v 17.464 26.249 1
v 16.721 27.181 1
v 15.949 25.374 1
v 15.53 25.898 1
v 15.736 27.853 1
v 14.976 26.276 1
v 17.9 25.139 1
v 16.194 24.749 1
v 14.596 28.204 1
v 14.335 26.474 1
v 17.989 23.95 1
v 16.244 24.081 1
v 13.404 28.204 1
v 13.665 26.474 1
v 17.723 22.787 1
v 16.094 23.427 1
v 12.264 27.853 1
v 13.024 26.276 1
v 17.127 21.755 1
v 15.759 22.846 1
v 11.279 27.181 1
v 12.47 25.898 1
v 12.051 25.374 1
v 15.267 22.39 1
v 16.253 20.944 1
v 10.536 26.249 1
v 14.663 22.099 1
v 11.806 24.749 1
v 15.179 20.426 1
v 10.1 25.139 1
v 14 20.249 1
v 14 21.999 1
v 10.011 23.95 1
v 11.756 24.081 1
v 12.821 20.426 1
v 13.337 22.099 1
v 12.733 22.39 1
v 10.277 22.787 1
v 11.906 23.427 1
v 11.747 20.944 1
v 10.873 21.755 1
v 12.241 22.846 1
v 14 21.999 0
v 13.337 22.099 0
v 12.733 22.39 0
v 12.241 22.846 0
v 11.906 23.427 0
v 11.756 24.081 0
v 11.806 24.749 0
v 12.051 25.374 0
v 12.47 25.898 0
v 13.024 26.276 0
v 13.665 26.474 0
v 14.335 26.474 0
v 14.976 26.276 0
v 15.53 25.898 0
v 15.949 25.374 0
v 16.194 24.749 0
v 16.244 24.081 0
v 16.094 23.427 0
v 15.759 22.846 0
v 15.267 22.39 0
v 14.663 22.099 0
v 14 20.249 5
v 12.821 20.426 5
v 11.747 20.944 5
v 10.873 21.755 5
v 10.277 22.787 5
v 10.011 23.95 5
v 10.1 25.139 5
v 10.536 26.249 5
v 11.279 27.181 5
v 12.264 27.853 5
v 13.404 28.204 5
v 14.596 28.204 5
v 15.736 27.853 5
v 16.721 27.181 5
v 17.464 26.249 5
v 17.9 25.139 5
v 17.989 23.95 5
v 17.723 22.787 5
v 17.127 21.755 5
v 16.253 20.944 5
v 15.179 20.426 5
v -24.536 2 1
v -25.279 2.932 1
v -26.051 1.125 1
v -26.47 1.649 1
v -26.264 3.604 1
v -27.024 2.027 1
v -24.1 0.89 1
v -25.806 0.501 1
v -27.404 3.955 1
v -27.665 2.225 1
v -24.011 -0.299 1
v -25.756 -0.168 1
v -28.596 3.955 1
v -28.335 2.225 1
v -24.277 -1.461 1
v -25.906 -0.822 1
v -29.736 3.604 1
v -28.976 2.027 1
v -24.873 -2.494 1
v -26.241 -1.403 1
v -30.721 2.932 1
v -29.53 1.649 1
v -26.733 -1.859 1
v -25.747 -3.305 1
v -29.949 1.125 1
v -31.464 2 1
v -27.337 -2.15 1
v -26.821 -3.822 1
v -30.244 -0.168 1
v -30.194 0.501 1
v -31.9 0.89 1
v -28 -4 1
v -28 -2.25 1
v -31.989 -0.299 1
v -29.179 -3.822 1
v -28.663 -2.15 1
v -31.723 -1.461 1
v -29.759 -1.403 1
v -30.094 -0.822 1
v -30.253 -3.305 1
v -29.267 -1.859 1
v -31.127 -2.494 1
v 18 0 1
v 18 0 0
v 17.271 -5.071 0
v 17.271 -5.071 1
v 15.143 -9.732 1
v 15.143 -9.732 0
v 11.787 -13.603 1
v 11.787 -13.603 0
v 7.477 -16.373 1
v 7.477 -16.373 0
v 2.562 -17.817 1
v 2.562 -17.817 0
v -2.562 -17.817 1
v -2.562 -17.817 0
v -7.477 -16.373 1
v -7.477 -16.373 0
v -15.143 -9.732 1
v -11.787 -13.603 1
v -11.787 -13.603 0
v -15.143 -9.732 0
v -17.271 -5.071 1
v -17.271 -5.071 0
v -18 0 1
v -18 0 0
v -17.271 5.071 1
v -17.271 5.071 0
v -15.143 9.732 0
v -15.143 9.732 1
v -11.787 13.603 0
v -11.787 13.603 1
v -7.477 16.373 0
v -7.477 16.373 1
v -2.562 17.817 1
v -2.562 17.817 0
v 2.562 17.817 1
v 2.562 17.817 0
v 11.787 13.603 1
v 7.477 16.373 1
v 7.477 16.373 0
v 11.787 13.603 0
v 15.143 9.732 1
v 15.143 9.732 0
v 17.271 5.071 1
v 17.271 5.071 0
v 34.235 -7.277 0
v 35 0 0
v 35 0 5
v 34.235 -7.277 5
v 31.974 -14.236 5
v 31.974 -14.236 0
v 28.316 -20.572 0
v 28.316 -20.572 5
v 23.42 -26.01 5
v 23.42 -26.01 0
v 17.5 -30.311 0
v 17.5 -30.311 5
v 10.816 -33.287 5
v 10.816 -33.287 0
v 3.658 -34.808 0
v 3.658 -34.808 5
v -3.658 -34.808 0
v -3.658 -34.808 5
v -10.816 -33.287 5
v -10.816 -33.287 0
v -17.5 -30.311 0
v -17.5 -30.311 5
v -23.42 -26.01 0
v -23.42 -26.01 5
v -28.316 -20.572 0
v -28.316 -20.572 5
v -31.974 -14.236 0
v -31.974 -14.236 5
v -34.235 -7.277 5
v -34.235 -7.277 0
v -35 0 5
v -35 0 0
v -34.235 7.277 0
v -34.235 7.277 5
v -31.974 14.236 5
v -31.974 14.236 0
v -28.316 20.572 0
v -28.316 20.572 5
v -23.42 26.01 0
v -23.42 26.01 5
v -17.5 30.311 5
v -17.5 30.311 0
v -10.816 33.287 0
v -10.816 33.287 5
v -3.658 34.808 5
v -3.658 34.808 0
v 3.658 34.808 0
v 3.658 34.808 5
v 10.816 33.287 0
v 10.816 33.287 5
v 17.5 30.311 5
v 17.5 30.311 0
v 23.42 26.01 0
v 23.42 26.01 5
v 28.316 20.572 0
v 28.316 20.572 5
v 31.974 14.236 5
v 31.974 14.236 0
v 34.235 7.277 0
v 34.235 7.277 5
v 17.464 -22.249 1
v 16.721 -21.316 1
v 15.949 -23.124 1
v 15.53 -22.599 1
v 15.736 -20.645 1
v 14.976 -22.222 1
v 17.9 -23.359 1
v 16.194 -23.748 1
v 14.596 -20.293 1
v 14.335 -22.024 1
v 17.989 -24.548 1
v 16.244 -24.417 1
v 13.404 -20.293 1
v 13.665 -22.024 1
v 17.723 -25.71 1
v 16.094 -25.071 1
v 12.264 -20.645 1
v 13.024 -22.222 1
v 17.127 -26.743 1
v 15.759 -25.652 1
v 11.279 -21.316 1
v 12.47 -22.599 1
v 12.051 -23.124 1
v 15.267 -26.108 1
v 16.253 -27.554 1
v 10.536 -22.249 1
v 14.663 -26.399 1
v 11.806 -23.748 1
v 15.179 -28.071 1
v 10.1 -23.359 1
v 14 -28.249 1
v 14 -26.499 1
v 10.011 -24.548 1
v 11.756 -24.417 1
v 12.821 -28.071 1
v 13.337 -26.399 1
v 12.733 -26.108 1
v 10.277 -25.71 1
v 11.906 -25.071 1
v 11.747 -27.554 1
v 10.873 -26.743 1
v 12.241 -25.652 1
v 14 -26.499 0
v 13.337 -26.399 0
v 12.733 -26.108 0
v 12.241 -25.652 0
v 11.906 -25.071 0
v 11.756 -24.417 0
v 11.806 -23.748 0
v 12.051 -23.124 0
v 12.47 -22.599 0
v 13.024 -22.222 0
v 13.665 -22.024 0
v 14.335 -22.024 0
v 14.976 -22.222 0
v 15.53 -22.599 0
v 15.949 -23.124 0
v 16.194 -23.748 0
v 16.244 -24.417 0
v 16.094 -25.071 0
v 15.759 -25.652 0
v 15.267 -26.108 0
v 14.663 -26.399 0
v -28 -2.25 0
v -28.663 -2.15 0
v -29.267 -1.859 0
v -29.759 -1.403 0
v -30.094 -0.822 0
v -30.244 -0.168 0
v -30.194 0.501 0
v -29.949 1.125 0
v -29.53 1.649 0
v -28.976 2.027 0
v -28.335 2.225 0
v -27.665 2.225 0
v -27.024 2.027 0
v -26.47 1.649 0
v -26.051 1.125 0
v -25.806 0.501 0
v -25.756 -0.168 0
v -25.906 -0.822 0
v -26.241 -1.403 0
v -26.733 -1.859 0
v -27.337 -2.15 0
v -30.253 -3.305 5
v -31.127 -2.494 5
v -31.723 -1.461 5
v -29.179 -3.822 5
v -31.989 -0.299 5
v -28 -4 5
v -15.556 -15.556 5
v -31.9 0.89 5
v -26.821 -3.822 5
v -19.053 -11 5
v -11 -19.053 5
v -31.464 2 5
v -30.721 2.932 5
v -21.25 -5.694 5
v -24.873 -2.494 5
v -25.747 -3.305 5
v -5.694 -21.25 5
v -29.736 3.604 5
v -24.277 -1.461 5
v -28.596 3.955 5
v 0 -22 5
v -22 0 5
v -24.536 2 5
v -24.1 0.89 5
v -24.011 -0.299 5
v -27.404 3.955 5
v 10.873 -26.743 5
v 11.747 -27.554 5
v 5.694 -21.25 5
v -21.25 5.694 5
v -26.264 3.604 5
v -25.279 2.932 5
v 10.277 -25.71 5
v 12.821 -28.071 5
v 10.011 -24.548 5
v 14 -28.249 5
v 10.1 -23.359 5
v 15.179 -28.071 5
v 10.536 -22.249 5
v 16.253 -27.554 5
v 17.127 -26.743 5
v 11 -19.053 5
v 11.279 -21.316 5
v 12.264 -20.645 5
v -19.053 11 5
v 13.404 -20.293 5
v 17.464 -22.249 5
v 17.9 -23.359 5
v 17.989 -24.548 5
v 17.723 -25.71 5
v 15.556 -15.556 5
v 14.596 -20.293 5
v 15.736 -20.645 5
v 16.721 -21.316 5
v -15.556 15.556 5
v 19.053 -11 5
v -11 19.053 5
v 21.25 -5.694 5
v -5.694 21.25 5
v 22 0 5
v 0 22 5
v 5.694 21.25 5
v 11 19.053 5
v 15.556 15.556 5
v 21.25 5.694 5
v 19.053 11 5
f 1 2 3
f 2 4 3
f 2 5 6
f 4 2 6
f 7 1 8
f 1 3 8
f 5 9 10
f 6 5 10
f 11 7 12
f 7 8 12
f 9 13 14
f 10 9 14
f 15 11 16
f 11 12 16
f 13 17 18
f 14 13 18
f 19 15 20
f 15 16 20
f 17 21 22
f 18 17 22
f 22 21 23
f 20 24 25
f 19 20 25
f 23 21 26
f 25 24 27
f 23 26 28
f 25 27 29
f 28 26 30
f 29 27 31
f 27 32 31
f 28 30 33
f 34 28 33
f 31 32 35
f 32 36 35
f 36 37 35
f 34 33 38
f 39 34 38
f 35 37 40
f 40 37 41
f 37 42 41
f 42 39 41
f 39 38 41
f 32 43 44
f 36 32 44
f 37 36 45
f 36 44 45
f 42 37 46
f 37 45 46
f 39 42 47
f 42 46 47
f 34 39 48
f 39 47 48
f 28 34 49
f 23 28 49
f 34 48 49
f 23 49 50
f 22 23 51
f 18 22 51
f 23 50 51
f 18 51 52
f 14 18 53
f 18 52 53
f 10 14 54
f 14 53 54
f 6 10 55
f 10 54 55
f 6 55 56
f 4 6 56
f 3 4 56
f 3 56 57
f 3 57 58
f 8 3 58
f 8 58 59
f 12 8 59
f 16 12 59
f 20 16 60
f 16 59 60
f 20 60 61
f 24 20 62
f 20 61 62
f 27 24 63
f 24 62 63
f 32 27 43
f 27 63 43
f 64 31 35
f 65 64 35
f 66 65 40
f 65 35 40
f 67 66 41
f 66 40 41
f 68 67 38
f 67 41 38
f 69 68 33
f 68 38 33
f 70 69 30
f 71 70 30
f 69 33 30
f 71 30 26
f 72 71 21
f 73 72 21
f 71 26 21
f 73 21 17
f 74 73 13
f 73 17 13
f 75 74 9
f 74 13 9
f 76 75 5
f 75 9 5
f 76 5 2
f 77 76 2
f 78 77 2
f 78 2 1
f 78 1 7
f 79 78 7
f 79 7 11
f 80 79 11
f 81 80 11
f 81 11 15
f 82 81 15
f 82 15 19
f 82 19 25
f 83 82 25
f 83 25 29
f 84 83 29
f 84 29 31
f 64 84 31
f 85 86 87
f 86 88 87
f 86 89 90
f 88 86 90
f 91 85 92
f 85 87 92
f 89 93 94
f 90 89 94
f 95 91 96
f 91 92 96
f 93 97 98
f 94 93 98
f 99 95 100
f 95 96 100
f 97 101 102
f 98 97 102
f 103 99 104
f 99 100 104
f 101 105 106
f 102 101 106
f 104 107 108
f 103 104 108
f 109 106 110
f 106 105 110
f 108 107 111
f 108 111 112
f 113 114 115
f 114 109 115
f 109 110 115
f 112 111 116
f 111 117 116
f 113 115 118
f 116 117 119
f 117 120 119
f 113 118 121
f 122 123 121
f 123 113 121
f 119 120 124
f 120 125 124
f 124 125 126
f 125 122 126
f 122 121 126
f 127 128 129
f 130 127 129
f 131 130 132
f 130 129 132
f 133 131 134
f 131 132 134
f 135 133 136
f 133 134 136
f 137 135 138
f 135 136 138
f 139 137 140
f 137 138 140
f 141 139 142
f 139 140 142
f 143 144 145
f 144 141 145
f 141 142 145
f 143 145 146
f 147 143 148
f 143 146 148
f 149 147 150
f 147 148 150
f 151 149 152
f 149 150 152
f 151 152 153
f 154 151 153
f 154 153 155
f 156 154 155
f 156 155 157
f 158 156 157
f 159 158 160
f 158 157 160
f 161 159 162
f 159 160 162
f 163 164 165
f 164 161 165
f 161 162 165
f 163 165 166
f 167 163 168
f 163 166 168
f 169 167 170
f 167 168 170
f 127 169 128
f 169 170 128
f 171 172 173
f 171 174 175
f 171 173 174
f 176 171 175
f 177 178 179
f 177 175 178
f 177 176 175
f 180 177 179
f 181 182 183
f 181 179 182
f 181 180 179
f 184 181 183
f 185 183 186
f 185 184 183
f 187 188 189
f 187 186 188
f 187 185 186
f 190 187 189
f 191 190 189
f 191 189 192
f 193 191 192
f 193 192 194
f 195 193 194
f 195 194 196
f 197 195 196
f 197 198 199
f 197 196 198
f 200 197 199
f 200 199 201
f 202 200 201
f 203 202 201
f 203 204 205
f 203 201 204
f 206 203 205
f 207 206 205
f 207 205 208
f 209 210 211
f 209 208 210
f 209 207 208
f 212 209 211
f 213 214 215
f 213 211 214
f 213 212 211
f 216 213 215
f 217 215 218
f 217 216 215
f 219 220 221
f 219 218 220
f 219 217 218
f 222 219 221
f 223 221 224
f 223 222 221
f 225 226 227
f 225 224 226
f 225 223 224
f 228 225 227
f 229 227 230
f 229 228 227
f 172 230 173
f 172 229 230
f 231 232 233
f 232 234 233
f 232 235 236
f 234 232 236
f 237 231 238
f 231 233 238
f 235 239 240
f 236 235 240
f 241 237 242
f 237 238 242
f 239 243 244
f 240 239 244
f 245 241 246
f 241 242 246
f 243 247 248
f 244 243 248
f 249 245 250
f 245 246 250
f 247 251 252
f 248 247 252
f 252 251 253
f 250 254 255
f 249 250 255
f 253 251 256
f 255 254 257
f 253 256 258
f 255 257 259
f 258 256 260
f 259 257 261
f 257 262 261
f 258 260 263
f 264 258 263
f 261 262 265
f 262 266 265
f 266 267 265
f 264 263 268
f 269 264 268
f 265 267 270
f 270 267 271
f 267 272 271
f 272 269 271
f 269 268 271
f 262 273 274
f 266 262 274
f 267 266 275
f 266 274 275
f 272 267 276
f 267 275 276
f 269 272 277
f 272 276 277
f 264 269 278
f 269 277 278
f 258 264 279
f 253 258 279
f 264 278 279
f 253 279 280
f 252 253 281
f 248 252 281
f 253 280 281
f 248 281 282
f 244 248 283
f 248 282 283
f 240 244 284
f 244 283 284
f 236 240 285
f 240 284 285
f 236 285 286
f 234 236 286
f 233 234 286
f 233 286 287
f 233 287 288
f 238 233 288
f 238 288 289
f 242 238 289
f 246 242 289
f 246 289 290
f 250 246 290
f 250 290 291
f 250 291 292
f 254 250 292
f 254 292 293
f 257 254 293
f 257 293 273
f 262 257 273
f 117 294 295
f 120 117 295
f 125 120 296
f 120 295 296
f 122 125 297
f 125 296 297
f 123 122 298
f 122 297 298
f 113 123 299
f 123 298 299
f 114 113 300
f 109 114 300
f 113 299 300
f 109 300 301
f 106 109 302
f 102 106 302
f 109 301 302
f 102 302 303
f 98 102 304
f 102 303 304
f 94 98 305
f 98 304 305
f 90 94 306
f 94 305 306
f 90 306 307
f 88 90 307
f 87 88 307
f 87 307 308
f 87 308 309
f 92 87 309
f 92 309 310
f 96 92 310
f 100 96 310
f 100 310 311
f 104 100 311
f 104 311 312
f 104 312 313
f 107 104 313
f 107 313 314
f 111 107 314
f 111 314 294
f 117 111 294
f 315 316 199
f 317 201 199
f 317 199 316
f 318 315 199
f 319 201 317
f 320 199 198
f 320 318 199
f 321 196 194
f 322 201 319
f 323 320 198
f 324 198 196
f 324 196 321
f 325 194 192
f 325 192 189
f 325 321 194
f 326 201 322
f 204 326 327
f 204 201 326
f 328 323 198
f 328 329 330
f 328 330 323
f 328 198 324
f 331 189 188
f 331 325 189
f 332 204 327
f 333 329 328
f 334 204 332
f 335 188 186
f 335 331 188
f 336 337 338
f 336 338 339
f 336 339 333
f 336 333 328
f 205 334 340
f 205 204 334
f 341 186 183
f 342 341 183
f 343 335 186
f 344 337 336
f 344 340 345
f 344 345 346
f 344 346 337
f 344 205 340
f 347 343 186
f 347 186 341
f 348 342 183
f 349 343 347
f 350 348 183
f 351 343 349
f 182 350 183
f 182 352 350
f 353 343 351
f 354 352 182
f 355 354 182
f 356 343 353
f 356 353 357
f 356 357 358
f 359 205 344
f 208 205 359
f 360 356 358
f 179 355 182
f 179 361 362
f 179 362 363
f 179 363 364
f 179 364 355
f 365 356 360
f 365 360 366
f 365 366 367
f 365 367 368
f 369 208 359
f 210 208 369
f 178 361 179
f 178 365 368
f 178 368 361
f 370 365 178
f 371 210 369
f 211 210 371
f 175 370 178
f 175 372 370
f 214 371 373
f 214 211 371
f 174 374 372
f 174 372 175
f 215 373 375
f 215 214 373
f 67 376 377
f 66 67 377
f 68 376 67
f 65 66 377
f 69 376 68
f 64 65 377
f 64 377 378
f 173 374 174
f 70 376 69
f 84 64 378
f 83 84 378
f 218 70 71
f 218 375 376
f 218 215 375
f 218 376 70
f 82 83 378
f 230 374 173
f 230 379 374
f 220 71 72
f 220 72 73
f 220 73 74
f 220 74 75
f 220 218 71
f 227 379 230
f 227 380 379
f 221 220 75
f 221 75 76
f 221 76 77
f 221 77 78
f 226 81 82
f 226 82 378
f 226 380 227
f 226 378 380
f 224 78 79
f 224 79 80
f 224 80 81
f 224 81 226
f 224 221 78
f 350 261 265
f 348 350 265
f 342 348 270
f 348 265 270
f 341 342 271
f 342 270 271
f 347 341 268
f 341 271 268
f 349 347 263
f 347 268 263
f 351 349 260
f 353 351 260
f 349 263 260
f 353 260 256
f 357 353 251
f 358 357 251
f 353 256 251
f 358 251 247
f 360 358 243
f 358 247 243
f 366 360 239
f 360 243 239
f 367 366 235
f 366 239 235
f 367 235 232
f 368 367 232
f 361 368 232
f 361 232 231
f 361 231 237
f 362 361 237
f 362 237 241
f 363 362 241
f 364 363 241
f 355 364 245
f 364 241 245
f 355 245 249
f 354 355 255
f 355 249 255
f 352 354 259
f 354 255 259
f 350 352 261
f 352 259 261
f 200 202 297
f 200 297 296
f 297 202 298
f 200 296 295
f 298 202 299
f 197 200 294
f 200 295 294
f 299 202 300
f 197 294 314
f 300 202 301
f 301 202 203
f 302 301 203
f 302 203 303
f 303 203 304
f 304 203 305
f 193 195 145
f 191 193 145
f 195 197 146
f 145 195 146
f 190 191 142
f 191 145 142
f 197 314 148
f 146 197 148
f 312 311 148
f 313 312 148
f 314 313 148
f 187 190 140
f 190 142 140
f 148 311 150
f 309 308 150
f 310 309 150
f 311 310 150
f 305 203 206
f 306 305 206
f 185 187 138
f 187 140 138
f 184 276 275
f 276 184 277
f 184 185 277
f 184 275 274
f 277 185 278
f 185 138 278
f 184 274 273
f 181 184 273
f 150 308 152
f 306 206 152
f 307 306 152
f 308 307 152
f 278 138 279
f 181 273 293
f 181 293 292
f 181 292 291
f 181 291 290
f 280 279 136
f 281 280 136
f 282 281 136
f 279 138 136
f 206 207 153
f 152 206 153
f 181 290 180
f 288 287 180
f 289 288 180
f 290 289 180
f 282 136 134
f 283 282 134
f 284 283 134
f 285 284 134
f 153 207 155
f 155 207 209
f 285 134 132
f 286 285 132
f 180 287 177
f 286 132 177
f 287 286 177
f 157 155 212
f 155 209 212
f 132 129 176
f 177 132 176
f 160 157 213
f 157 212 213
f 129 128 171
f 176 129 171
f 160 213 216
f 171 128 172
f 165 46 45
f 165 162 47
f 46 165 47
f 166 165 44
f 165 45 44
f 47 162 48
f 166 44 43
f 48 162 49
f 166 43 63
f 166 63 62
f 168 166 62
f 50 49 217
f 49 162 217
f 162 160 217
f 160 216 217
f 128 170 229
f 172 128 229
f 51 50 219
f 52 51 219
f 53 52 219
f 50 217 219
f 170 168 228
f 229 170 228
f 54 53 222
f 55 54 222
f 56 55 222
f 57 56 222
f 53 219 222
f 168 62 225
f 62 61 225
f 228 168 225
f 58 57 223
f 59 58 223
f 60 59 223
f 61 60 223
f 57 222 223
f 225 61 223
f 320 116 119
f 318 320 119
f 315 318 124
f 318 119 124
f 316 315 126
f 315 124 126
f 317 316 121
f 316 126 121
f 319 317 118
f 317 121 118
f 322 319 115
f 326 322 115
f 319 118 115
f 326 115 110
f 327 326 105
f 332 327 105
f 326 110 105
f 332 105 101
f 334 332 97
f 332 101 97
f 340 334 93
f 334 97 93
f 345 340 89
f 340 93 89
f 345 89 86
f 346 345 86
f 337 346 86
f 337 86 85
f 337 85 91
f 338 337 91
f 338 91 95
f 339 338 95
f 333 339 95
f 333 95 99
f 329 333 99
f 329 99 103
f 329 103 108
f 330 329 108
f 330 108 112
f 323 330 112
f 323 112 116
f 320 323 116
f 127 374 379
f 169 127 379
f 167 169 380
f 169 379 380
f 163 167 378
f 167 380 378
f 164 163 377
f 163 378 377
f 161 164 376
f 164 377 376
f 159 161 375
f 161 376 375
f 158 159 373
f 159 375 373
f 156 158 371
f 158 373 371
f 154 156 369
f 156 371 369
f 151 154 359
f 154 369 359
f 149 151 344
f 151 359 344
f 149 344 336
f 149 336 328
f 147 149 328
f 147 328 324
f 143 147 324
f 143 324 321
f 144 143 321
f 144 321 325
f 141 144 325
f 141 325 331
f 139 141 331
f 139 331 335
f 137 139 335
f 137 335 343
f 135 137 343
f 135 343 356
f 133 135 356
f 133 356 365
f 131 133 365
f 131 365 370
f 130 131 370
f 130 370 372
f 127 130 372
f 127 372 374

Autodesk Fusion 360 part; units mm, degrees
sketch "Sketch1" plane through (0, 0, 0) normal (0, 0, 1) x (1, 0, 0)
  circle A0 centre (0, 0) radius 18
  circle A1 centre (0, 0) radius 35
  dimension "d1" = 36
  dimension "d2" = 70
extrude "Extrude1" add sketch "Sketch1" along normal blind 5
sketch "Sketch2" plane through (0, 0, 5) normal (0, 0, 1) x (-1, 0, 0)
  circle A0 centre (0, 0) radius 18
  circle A1 centre (0, 0) radius 35
  line L0 (0, 0) -> (28, 0) construction
  line L1 (0, 0) -> (-14, -24.2487) construction
  line L2 (0, 0) -> (-14, 24.2487) construction
  dimension "d5" = 28
  dimension "d8" = 28
  dimension "d13" = 120
  dimension "d14" = 28
  dimension "d15" = 120
hole "Hole1" at (-28, 0, 5) at (14, -24.2487, 5) at (14, 24.2487, 5) direction (0, 0, -1) diameter 4.5 end through all counterbore diameter 8 counterbore depth 4
chamfer "Chamfer1" distance 4 angle 45 1 edges at (-16.7819, 6.5091, 5)
equation "d8 = d5"
equation "d14 = d5"
equation "d15 = d13"
